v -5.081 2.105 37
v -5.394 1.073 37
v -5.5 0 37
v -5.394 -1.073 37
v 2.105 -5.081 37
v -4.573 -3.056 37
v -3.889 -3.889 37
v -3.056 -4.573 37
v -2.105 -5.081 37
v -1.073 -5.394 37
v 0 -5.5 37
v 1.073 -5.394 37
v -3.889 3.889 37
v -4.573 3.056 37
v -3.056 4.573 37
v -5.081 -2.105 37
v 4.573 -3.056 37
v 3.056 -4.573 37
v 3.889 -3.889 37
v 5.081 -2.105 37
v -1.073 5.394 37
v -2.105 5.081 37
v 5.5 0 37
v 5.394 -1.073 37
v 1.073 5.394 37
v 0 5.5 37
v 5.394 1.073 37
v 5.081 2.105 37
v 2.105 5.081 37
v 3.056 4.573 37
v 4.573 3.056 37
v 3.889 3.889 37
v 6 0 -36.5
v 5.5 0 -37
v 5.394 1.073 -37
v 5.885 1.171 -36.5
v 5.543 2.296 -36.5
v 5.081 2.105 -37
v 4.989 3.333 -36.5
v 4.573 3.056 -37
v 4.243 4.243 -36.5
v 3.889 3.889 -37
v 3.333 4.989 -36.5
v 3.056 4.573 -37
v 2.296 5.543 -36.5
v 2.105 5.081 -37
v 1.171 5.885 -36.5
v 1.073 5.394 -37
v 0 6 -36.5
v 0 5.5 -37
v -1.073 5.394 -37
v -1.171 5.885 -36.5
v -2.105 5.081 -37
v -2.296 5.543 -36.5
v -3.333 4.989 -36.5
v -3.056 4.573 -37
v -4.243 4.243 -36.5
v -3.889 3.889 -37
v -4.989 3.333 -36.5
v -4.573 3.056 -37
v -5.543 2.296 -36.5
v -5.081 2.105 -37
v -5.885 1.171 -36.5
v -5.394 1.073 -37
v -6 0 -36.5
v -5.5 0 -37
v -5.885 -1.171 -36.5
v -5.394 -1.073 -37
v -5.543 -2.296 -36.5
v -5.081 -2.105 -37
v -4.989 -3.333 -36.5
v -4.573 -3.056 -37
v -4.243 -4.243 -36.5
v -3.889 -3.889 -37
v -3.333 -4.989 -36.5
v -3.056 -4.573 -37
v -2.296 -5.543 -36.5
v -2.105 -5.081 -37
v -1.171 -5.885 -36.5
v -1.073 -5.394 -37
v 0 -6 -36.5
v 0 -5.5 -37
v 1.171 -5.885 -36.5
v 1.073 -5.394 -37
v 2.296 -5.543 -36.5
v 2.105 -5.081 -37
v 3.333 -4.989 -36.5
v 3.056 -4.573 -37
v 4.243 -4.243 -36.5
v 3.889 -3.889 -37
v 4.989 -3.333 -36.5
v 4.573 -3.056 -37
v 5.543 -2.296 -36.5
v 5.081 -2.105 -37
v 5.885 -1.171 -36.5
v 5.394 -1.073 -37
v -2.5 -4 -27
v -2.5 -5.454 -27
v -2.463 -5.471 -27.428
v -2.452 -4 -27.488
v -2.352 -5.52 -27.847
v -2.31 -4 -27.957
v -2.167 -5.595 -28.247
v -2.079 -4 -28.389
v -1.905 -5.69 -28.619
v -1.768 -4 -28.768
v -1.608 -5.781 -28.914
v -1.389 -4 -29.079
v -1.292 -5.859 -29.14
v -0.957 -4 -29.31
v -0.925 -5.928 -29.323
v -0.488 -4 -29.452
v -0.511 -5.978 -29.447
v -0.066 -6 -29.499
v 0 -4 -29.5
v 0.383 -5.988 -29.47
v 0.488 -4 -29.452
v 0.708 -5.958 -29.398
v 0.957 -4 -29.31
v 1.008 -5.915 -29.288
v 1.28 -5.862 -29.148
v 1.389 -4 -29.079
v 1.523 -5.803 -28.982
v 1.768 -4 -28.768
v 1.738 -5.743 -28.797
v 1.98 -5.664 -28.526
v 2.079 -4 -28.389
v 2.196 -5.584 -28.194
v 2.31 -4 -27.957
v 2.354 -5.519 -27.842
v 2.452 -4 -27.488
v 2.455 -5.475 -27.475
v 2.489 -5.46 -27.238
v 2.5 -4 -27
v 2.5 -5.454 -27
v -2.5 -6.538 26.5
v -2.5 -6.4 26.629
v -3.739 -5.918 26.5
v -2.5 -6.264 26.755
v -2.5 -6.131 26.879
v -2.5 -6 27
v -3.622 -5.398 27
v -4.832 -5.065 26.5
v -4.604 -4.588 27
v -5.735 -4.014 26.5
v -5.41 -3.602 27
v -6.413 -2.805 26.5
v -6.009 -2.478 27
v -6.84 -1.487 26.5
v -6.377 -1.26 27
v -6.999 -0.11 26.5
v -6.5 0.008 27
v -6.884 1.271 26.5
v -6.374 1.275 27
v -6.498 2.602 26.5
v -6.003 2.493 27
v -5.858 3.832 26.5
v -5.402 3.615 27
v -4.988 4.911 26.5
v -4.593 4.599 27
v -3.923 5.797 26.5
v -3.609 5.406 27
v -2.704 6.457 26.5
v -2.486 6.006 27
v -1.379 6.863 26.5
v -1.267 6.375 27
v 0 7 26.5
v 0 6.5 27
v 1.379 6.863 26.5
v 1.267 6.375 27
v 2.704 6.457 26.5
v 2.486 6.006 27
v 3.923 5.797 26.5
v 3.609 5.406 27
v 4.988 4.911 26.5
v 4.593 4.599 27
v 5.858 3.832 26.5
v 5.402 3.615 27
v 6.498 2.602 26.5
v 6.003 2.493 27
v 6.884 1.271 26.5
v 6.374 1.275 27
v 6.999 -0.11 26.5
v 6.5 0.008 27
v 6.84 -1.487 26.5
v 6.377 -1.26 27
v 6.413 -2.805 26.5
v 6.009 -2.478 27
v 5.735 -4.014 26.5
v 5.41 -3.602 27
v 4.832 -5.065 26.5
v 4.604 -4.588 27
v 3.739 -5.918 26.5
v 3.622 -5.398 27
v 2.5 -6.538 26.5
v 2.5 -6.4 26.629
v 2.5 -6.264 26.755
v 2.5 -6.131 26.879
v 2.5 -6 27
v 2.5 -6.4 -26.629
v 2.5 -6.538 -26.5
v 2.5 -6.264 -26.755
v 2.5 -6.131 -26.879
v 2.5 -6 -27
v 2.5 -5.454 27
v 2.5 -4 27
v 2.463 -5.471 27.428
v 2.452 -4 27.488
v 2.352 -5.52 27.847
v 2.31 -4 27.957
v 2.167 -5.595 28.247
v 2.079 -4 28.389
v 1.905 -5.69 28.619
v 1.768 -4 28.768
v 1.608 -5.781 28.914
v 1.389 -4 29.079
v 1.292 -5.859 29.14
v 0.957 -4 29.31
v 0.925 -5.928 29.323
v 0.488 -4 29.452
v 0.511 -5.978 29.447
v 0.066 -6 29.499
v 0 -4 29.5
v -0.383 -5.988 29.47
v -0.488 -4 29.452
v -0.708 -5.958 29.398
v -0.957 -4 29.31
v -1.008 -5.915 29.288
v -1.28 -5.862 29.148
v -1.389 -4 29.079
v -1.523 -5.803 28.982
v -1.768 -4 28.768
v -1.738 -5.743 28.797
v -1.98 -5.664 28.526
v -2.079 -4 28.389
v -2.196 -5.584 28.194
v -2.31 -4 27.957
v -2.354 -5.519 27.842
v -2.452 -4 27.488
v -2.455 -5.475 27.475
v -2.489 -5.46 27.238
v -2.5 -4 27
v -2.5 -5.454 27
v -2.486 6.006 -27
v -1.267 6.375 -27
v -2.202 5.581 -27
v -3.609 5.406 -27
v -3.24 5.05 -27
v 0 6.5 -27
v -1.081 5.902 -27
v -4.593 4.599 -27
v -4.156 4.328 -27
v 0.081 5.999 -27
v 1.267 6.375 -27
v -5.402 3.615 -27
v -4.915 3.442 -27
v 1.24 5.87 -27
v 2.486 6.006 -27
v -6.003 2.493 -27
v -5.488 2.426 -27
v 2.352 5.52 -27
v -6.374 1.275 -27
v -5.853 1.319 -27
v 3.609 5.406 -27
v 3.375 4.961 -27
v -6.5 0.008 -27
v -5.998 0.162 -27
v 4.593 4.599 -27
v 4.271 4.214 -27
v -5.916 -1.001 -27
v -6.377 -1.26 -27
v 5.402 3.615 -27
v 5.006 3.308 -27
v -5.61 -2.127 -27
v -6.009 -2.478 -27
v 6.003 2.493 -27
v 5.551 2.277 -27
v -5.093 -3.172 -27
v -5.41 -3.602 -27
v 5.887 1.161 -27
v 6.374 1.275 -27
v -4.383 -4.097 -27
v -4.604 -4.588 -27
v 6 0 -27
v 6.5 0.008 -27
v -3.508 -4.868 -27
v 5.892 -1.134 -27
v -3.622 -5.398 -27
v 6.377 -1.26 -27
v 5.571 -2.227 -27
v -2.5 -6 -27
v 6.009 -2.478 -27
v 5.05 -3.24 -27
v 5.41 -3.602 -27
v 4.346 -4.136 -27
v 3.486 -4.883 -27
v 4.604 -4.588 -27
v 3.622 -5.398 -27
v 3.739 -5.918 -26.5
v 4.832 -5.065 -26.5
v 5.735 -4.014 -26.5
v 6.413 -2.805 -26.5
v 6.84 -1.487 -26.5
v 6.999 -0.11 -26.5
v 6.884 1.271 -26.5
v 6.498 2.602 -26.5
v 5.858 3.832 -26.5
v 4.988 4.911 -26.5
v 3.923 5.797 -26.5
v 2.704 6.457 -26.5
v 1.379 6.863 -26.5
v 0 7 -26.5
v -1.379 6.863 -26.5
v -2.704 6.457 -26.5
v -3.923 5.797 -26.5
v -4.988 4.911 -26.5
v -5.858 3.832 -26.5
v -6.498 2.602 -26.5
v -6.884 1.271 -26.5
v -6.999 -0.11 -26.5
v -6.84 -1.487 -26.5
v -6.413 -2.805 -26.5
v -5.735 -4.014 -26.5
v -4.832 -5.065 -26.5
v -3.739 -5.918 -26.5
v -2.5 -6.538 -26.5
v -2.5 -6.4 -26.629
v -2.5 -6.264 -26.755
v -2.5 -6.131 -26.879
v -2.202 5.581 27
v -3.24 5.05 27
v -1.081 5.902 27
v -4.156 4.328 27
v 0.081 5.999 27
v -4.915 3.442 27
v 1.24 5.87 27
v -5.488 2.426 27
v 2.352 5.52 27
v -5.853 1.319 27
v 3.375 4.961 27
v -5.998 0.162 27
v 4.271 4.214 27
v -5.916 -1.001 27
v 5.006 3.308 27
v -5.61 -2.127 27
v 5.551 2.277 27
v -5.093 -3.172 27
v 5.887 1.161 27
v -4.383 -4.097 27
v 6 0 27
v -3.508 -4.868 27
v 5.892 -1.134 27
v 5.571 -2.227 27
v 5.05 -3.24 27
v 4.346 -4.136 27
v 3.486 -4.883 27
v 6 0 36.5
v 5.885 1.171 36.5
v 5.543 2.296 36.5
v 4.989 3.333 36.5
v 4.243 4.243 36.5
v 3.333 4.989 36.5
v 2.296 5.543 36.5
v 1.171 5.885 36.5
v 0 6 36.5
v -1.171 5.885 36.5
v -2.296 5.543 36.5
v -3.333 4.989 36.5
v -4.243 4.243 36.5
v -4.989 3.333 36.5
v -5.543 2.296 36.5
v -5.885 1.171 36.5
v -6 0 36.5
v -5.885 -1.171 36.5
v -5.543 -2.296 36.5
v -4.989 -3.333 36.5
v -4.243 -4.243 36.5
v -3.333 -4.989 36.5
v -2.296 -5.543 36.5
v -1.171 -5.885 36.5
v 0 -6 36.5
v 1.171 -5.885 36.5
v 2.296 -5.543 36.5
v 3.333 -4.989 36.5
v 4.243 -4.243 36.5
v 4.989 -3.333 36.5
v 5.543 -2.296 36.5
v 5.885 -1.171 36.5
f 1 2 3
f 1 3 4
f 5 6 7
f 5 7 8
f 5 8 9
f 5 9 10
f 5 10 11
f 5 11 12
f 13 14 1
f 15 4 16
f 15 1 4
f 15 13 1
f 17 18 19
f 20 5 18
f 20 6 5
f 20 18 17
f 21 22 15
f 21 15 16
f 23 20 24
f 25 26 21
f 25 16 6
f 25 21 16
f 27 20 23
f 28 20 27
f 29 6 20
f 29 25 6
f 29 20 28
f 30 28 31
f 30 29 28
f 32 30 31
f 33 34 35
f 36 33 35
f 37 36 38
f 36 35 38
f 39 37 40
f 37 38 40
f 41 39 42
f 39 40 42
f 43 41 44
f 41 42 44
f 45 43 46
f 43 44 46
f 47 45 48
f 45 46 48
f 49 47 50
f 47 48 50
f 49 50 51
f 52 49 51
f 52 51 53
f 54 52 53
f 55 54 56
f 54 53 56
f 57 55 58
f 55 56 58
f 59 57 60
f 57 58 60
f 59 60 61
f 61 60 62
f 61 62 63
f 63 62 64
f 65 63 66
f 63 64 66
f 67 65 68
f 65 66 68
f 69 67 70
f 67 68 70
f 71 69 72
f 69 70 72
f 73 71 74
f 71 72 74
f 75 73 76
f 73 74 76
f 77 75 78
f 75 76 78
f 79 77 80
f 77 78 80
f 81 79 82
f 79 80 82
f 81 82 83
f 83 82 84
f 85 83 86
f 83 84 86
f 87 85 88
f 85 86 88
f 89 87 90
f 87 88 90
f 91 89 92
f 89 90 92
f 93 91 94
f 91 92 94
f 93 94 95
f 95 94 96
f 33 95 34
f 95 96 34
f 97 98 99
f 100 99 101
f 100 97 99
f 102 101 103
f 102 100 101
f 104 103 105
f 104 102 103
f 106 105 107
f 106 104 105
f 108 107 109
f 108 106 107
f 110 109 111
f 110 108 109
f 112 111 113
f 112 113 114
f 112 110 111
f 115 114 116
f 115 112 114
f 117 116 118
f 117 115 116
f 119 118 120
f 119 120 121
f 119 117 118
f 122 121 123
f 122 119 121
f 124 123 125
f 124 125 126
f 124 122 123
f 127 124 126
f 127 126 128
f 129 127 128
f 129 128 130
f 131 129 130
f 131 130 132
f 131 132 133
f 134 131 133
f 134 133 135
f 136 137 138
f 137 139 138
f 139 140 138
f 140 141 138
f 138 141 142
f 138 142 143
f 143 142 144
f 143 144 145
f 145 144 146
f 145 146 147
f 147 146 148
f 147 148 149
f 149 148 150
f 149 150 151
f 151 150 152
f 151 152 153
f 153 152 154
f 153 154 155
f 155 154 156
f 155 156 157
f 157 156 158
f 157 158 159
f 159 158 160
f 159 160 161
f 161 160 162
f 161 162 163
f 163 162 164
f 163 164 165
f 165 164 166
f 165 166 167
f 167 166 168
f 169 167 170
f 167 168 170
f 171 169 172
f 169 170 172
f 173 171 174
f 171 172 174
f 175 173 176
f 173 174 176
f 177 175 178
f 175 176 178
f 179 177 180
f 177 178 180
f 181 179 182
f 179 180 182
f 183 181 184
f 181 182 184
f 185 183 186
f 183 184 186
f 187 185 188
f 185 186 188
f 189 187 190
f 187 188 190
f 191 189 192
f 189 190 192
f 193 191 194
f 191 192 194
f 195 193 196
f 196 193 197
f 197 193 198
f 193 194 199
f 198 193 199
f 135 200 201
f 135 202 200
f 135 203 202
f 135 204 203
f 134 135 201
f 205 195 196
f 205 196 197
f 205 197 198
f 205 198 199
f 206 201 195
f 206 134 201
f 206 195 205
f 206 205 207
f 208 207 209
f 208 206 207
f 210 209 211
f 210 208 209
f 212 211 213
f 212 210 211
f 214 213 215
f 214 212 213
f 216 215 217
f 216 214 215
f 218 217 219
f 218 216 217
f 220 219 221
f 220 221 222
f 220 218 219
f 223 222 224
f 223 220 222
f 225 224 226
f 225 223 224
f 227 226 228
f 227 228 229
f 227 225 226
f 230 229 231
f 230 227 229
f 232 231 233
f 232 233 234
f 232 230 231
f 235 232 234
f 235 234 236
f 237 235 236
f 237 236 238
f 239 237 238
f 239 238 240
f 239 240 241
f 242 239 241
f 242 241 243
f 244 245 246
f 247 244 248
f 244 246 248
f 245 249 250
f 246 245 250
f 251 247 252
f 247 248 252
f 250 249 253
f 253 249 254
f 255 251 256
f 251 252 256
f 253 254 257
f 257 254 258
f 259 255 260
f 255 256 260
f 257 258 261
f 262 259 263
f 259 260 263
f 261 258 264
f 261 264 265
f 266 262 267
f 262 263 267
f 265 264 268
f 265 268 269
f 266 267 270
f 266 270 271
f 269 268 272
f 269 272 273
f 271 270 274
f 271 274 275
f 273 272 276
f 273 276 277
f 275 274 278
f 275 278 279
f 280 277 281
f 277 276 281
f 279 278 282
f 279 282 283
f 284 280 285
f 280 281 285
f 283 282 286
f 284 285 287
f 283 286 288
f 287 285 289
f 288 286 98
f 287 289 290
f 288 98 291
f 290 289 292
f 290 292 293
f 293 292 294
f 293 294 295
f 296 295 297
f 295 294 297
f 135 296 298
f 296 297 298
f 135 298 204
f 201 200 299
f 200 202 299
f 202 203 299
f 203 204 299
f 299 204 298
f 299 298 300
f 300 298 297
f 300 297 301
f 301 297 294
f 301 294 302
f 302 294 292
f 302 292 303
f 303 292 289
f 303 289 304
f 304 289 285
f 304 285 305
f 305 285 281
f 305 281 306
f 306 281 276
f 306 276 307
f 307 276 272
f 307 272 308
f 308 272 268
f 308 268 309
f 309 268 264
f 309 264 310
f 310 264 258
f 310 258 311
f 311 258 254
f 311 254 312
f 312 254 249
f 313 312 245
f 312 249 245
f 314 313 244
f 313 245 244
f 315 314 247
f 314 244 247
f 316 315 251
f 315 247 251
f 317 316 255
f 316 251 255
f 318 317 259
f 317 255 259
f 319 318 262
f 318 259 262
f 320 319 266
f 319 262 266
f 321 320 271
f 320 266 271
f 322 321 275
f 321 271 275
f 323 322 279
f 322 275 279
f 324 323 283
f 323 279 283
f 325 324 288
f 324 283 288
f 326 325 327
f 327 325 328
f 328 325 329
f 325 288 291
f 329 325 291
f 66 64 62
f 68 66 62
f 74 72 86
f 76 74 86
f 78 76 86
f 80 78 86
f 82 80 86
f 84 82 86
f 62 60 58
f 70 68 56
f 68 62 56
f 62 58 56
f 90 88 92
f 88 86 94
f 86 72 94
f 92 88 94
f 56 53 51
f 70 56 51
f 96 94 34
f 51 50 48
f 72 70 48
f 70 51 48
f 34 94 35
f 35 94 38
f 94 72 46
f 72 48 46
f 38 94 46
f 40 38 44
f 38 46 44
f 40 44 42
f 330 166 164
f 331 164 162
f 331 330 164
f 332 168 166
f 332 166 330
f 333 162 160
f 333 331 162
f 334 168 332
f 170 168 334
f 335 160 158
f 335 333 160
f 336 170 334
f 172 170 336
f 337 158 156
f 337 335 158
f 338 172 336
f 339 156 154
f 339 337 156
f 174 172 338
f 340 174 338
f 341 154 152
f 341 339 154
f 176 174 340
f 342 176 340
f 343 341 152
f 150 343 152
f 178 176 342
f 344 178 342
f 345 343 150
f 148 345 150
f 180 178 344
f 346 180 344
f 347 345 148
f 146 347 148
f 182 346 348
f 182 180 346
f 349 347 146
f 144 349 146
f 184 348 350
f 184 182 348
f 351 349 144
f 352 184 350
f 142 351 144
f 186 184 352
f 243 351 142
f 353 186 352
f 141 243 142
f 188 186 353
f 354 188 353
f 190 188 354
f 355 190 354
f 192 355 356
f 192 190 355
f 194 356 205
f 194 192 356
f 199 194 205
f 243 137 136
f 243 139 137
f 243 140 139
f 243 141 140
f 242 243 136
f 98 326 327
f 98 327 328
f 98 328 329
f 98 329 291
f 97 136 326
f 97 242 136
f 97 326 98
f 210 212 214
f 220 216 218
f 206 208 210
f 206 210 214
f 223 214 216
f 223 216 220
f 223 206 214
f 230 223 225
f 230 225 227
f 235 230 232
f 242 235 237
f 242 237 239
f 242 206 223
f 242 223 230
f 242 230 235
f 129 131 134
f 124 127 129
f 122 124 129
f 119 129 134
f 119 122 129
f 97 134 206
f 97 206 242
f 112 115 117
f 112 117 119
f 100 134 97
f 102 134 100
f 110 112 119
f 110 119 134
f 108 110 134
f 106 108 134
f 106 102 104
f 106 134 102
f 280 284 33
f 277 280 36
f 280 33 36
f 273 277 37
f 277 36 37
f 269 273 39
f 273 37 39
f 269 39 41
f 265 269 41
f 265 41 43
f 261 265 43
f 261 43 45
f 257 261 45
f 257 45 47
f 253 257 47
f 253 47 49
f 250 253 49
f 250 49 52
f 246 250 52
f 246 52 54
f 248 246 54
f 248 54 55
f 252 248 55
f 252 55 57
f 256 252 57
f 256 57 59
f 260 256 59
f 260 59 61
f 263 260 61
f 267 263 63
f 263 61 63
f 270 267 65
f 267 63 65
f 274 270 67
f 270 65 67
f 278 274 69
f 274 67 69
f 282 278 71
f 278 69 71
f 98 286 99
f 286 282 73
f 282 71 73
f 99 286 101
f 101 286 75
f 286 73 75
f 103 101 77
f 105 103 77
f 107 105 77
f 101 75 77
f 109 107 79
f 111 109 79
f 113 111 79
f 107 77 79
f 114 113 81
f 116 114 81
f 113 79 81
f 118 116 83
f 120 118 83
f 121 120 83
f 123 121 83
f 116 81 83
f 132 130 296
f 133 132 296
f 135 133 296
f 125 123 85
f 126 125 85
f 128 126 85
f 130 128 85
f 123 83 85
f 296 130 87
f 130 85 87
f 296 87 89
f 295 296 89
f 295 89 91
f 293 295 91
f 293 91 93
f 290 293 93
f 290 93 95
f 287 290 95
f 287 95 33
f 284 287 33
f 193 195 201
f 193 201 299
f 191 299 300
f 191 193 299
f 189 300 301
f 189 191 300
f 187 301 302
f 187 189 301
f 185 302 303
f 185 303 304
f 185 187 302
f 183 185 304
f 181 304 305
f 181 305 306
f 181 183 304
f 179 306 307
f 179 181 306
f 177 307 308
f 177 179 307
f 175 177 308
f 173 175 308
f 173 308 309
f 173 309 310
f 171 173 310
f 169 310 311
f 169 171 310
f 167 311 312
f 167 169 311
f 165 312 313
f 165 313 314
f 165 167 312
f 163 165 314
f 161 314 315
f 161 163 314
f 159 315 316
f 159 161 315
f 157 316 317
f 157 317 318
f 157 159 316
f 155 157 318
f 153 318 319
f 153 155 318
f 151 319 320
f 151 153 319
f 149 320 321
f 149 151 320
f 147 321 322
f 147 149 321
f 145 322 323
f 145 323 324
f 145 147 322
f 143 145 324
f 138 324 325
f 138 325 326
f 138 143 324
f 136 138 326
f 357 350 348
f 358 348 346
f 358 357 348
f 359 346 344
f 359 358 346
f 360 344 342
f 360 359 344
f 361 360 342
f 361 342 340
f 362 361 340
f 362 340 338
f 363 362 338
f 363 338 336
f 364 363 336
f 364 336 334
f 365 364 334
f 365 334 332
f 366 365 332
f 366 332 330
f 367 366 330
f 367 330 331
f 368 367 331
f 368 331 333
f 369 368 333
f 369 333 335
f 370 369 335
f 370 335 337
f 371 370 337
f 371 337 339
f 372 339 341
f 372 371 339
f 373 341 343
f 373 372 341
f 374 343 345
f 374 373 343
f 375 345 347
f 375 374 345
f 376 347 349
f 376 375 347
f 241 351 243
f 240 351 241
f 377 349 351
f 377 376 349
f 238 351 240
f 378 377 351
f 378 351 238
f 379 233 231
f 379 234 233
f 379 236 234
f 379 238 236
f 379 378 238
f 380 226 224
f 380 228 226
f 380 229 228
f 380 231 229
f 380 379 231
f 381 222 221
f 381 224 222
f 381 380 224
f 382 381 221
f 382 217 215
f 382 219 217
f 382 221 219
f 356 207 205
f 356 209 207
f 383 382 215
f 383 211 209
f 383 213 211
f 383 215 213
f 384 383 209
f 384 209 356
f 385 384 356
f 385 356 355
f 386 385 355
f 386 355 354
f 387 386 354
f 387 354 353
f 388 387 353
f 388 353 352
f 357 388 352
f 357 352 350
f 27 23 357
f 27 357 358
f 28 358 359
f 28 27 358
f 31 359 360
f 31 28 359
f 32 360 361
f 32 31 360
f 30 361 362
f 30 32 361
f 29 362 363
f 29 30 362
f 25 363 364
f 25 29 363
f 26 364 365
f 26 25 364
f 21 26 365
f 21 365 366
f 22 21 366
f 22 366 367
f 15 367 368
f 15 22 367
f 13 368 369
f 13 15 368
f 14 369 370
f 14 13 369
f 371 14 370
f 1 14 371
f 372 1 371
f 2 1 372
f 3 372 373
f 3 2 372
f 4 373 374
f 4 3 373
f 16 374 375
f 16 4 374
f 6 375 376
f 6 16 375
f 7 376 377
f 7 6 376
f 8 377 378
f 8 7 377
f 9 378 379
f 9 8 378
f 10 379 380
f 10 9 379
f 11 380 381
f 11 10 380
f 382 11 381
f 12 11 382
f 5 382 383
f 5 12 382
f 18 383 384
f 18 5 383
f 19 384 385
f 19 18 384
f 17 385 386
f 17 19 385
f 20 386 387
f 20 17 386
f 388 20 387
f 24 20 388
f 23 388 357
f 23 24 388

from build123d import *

# Parameters (mm, degrees)
SKETCH1_R      = 7
EXTRUDE1_DEPTH = 37
EXTRUDE3_START = -4
EXTRUDE3_DEPTH = 35.301436004
SKETCH4_R      = 7
SKETCH4_R_2    = 6
EXTRUDE4_DEPTH = 10
CHAMFER1_SIZE  = 0.5


with BuildPart() as part:
    # Sketch1 → Extrude1 (new, symmetric)
    with BuildSketch(Plane.XY):
        Circle(SKETCH1_R)
    extrude(amount=EXTRUDE1_DEPTH, both=True)

    # Sketch3 → Extrude3 (cut, through all)
    with BuildSketch(Plane(origin=(0, 0, 0), x_dir=(1, 0, 0), z_dir=(0, 1, 0)).offset(EXTRUDE3_START)):
        with BuildLine():
            Line((-2.5, -27), (-2.5, 27))
            ThreePointArc((-2.5, 27), (0, 29.5), (2.5, 27))
            Line((2.5, 27), (2.5, -27))
            ThreePointArc((2.5, -27), (0, -29.5), (-2.5, -27))
        make_face()
    extrude(amount=-EXTRUDE3_DEPTH, mode=Mode.SUBTRACT)

    # Sketch4 → Extrude4 (cut)
    with BuildSketch(Plane.XY.offset(37)):
        with Locations(Location((0, 0, 0), (0, 0, 249.075167572))):
            Circle(SKETCH4_R)
        Circle(SKETCH4_R_2, mode=Mode.SUBTRACT)
    extrude4 = extrude(amount=-EXTRUDE4_DEPTH, mode=Mode.SUBTRACT)

    # Mirror1: Extrude4 across plane
    add(extrude4.mirror(Plane.XY), mode=Mode.SUBTRACT)

    # Chamfer1
    chamfer1_edges = [part.edges().sort_by_distance(p)[0] for p in [
        (0, 7, 27),
        (-6, 0, 37),
        (0, 7, -27),
        (-6, 0, -37),
    ]]
    chamfer(chamfer1_edges, length=CHAMFER1_SIZE)


solid = part.part
